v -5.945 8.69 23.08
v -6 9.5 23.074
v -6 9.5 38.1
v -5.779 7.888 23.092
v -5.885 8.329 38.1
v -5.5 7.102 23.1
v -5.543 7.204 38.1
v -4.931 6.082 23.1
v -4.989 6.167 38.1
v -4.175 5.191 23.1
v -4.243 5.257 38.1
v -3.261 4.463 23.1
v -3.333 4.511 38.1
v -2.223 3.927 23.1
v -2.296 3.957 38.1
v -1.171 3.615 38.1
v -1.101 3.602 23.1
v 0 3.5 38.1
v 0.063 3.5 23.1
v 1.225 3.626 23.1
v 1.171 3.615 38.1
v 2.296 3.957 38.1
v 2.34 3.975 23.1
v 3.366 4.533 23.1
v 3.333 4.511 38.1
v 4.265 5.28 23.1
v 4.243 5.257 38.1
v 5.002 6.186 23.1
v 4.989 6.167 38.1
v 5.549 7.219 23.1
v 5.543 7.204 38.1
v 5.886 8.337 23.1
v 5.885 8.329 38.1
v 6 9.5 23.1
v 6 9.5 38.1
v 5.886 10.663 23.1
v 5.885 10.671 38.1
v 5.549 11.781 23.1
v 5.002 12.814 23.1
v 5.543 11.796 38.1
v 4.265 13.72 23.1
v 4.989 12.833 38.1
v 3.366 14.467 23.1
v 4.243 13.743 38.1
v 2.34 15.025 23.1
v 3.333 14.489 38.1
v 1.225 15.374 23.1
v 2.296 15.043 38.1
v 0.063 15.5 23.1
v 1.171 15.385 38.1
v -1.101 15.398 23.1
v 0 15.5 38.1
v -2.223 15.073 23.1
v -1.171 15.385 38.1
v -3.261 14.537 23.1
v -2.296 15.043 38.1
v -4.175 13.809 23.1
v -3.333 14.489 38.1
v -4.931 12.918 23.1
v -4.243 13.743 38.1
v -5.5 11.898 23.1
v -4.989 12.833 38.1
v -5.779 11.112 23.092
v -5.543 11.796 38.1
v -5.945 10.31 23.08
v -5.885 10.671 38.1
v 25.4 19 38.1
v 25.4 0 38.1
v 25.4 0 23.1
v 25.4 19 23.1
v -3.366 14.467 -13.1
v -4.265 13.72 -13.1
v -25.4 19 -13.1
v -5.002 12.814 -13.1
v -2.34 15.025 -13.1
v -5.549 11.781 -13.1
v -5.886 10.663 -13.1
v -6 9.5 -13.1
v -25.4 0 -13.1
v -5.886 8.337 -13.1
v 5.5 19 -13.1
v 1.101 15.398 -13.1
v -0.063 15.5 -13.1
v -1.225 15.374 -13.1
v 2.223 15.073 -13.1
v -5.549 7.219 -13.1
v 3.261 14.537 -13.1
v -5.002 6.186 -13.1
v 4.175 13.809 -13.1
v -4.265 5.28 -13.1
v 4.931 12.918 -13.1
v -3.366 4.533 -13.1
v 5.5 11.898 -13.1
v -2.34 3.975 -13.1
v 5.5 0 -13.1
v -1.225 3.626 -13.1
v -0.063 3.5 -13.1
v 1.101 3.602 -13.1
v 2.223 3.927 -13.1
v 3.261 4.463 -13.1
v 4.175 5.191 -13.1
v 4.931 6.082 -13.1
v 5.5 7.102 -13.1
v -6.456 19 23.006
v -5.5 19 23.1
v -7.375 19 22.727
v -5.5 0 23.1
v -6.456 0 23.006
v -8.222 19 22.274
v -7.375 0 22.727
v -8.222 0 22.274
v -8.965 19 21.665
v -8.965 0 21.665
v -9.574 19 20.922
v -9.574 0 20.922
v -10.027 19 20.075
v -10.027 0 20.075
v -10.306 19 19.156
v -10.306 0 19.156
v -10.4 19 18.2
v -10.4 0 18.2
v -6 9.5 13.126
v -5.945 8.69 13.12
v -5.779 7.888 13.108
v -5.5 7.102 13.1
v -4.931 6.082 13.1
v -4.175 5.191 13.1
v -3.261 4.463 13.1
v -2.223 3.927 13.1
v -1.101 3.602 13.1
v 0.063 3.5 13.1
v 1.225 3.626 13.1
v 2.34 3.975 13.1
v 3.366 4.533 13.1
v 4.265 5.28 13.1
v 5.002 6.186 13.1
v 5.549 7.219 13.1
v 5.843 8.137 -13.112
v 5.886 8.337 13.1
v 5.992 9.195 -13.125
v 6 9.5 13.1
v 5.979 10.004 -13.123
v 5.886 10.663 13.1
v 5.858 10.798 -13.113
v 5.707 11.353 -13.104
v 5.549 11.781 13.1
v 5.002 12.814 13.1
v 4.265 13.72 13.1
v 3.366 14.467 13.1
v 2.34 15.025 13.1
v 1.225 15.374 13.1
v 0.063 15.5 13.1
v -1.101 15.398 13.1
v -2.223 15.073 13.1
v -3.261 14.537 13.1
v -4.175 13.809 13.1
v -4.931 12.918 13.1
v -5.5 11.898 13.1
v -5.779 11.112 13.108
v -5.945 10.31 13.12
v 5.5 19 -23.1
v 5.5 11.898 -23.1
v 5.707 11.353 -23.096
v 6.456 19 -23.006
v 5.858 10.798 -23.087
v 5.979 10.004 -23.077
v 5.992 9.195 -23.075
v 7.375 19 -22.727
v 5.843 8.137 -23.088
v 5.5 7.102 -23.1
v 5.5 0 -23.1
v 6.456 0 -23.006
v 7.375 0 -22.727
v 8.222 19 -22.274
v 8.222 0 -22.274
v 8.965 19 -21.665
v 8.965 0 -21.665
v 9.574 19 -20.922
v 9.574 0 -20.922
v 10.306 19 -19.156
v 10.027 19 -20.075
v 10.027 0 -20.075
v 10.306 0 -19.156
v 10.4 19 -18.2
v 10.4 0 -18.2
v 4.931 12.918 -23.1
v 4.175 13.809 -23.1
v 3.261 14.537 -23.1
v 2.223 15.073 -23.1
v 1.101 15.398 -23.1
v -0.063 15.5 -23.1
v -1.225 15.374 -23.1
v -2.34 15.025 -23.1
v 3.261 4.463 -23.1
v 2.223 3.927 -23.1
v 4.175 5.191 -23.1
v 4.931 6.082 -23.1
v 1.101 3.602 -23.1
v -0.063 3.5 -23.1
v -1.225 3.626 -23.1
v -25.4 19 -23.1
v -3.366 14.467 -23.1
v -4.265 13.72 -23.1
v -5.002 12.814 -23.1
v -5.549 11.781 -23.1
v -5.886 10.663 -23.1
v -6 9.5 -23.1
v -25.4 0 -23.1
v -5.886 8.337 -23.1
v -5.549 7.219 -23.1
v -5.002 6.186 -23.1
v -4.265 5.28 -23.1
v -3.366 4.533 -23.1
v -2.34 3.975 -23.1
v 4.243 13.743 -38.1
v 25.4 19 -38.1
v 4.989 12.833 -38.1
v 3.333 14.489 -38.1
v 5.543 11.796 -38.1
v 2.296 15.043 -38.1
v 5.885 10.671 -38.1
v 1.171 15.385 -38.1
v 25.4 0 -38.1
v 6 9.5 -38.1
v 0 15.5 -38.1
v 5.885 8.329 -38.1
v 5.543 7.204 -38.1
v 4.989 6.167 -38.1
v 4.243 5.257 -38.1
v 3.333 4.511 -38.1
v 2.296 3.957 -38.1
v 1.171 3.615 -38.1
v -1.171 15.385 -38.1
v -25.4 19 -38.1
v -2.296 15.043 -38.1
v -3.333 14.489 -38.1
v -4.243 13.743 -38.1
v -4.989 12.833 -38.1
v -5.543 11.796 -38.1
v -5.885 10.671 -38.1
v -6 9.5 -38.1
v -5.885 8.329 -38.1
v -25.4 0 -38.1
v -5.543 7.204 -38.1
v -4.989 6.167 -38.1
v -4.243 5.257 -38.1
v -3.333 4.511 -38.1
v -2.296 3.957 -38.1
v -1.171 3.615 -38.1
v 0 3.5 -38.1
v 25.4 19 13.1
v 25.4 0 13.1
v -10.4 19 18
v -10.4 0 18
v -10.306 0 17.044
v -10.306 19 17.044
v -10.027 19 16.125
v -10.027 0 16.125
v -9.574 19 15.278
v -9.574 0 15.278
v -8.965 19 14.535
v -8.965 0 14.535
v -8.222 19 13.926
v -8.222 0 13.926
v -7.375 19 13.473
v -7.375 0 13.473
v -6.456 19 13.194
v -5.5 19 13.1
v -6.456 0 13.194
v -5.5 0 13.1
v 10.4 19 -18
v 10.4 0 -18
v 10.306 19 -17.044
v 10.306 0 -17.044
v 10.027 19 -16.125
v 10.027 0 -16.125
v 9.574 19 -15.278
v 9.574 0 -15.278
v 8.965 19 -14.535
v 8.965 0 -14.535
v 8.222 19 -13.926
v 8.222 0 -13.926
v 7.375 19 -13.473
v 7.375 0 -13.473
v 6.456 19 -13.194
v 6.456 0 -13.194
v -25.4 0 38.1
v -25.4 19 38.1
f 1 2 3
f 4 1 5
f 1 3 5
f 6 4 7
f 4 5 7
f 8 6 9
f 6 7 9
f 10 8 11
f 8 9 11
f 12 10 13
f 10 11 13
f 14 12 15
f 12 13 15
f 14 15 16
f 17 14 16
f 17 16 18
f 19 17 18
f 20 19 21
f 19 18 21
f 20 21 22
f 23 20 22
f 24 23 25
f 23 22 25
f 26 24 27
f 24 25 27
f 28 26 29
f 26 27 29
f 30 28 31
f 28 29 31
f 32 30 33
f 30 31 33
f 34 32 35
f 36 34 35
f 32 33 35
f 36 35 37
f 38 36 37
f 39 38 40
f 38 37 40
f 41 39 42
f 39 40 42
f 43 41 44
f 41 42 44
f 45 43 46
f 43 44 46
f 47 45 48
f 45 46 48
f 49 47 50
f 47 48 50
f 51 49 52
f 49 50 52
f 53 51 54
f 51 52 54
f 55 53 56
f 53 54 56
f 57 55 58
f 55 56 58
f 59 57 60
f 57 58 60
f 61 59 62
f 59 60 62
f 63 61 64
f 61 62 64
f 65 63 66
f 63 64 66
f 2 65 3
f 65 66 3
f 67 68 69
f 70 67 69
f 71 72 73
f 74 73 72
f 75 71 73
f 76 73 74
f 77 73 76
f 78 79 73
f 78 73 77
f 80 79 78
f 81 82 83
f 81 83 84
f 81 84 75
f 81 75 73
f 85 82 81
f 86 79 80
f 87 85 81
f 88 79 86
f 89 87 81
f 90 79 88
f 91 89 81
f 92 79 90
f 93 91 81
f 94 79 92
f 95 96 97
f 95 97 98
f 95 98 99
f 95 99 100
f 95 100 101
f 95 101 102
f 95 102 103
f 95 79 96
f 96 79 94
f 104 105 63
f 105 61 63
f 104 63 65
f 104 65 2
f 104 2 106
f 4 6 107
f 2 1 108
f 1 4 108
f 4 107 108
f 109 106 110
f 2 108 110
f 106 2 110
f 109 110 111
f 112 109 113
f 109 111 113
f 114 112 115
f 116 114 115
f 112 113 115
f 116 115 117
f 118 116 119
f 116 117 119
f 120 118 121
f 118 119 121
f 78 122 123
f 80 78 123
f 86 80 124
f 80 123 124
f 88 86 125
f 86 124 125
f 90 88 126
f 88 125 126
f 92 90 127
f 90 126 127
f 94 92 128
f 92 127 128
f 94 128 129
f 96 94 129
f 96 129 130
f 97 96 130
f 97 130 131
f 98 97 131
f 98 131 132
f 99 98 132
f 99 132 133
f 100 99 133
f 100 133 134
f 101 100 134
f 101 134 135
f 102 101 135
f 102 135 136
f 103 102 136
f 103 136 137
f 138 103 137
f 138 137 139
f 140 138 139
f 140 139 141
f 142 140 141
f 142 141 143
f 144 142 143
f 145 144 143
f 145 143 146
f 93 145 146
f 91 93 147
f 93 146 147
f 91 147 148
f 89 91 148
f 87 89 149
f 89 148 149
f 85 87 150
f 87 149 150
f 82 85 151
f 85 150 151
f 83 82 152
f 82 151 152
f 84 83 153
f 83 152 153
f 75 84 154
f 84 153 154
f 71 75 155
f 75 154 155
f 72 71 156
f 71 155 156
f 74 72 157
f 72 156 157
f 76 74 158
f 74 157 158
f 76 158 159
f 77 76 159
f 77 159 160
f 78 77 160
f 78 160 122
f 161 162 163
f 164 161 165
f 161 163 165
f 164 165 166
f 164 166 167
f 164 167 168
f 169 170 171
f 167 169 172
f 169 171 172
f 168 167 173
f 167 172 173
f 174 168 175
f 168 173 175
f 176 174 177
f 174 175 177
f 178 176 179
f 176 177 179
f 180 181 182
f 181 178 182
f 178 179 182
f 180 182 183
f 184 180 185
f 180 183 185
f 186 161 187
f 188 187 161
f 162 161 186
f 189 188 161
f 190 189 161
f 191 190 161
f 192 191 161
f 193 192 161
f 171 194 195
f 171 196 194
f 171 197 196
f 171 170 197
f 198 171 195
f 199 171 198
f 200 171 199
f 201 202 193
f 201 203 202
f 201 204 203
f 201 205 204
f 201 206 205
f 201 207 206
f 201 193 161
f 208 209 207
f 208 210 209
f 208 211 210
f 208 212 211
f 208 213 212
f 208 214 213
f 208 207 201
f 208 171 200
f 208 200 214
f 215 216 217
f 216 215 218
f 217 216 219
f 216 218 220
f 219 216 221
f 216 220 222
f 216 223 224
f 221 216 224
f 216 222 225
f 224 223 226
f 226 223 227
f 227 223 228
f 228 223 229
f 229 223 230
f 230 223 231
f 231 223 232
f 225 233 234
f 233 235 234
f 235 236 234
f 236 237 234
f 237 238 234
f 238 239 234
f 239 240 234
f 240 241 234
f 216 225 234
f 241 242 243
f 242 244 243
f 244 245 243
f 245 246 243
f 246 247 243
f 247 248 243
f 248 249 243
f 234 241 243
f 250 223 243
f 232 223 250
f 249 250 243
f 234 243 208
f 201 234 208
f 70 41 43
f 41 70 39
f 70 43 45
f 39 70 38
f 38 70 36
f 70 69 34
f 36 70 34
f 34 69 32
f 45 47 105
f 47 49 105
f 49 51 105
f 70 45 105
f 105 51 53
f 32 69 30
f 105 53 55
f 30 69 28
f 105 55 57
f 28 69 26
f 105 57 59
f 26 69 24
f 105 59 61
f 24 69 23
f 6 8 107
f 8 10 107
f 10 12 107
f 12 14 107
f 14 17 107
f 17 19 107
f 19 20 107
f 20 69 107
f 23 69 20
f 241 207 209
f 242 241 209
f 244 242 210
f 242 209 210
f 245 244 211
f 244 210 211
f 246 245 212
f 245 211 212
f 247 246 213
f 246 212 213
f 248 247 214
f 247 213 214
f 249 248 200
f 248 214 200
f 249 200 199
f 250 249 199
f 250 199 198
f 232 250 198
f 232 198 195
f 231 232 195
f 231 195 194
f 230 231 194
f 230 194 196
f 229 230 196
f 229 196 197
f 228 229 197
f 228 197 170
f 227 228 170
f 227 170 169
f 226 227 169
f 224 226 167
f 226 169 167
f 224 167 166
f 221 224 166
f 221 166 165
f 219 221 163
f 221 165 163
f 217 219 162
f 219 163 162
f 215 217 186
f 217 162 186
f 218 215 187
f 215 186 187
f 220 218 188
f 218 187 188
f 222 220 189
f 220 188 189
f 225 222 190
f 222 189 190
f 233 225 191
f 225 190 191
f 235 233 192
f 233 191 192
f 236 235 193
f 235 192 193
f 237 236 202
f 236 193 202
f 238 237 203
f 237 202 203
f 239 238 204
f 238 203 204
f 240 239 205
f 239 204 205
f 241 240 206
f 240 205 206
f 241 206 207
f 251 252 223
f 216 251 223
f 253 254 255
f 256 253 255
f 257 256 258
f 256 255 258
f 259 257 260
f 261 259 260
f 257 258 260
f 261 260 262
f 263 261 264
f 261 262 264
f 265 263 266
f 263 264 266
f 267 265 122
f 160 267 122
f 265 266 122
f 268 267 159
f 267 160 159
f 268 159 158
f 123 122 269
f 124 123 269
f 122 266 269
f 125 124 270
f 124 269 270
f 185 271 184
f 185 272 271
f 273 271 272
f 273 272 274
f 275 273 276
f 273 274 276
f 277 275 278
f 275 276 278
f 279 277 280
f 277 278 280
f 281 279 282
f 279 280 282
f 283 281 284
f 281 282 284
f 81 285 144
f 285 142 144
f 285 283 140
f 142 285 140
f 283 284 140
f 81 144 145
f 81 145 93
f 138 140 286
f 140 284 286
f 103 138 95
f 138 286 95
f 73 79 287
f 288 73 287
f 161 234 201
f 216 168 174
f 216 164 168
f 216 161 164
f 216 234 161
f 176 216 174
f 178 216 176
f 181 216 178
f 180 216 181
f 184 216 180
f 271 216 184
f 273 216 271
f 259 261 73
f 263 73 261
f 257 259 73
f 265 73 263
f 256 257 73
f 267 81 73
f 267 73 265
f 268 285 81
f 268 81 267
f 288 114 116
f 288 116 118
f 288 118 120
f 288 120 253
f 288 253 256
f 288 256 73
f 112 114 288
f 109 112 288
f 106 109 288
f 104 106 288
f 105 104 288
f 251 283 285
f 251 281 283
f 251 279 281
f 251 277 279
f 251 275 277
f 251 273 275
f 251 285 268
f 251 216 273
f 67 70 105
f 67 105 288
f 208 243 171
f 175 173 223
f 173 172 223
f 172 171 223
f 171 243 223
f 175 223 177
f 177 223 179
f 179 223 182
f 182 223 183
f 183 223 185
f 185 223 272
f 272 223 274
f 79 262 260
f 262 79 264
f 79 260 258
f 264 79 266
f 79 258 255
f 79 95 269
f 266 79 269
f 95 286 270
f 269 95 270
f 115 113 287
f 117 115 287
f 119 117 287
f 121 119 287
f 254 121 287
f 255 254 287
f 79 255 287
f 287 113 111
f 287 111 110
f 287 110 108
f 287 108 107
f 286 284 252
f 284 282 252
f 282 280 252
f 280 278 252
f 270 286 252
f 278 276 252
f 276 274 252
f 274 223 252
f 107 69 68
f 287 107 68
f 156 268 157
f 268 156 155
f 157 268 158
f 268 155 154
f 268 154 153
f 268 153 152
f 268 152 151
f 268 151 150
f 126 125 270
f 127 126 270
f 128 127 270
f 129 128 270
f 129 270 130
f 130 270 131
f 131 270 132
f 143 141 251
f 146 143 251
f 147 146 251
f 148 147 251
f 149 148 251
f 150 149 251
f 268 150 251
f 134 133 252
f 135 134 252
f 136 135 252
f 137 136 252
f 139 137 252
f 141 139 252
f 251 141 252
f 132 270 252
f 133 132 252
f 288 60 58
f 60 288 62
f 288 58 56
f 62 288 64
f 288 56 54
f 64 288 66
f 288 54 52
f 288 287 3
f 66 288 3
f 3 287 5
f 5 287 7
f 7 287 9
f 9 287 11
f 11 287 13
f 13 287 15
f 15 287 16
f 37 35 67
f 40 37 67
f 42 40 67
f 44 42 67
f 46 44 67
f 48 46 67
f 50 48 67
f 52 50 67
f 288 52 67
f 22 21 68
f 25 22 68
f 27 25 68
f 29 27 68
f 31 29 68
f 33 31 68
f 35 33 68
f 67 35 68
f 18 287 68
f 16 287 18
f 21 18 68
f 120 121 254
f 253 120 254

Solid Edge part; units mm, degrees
sketch "Sketch1" plane through (0, 0, 0) normal (0, -1, 0) x (1, 0, 0)
  arc A0 (-5.5, 23.1) -> (-10.4, 18.2) centre (-5.5, 18.2) ccw
  line L0 (-10.4, 18.2) -> (-10.4, 18)
  arc A1 (-10.4, 18) -> (-5.5, 13.1) centre (-5.5, 18) ccw
  line L1 (-5.5, 13.1) -> (25.4, 13.1)
  line L2 (25.4, 13.1) -> (25.4, -38.1)
  line L3 (25.4, -38.1) -> (-25.4, -38.1)
  line L4 (-25.4, -38.1) -> (-25.4, -23.1)
  line L5 (5.5, -23.1) -> (-25.4, -23.1)
  arc A2 (10.4, -18.2) -> (5.5, -23.1) centre (5.5, -18.2) cw
  line L6 (10.4, -18) -> (10.4, -18.2)
  arc A3 (5.5, -13.1) -> (10.4, -18) centre (5.5, -18) cw
  line L7 (-25.4, -13.1) -> (5.5, -13.1)
  line L8 (-25.4, -13.1) -> (-25.4, 38.1)
  line L9 (-25.4, 38.1) -> (25.4, 38.1)
  line L10 (25.4, 38.1) -> (25.4, 23.1)
  line L11 (25.4, 23.1) -> (-5.5, 23.1)
extrude "Protrusion1" add sketch "Sketch1" against normal blind 19
sketch "Sketch2" plane through (0, 9.5, 38.1) normal (0, 0, 1) x (-1, 0, 0)
  circle A0 centre (0, 0) radius 6
extrude "Cutout1" cut sketch "Sketch2" against normal through all
